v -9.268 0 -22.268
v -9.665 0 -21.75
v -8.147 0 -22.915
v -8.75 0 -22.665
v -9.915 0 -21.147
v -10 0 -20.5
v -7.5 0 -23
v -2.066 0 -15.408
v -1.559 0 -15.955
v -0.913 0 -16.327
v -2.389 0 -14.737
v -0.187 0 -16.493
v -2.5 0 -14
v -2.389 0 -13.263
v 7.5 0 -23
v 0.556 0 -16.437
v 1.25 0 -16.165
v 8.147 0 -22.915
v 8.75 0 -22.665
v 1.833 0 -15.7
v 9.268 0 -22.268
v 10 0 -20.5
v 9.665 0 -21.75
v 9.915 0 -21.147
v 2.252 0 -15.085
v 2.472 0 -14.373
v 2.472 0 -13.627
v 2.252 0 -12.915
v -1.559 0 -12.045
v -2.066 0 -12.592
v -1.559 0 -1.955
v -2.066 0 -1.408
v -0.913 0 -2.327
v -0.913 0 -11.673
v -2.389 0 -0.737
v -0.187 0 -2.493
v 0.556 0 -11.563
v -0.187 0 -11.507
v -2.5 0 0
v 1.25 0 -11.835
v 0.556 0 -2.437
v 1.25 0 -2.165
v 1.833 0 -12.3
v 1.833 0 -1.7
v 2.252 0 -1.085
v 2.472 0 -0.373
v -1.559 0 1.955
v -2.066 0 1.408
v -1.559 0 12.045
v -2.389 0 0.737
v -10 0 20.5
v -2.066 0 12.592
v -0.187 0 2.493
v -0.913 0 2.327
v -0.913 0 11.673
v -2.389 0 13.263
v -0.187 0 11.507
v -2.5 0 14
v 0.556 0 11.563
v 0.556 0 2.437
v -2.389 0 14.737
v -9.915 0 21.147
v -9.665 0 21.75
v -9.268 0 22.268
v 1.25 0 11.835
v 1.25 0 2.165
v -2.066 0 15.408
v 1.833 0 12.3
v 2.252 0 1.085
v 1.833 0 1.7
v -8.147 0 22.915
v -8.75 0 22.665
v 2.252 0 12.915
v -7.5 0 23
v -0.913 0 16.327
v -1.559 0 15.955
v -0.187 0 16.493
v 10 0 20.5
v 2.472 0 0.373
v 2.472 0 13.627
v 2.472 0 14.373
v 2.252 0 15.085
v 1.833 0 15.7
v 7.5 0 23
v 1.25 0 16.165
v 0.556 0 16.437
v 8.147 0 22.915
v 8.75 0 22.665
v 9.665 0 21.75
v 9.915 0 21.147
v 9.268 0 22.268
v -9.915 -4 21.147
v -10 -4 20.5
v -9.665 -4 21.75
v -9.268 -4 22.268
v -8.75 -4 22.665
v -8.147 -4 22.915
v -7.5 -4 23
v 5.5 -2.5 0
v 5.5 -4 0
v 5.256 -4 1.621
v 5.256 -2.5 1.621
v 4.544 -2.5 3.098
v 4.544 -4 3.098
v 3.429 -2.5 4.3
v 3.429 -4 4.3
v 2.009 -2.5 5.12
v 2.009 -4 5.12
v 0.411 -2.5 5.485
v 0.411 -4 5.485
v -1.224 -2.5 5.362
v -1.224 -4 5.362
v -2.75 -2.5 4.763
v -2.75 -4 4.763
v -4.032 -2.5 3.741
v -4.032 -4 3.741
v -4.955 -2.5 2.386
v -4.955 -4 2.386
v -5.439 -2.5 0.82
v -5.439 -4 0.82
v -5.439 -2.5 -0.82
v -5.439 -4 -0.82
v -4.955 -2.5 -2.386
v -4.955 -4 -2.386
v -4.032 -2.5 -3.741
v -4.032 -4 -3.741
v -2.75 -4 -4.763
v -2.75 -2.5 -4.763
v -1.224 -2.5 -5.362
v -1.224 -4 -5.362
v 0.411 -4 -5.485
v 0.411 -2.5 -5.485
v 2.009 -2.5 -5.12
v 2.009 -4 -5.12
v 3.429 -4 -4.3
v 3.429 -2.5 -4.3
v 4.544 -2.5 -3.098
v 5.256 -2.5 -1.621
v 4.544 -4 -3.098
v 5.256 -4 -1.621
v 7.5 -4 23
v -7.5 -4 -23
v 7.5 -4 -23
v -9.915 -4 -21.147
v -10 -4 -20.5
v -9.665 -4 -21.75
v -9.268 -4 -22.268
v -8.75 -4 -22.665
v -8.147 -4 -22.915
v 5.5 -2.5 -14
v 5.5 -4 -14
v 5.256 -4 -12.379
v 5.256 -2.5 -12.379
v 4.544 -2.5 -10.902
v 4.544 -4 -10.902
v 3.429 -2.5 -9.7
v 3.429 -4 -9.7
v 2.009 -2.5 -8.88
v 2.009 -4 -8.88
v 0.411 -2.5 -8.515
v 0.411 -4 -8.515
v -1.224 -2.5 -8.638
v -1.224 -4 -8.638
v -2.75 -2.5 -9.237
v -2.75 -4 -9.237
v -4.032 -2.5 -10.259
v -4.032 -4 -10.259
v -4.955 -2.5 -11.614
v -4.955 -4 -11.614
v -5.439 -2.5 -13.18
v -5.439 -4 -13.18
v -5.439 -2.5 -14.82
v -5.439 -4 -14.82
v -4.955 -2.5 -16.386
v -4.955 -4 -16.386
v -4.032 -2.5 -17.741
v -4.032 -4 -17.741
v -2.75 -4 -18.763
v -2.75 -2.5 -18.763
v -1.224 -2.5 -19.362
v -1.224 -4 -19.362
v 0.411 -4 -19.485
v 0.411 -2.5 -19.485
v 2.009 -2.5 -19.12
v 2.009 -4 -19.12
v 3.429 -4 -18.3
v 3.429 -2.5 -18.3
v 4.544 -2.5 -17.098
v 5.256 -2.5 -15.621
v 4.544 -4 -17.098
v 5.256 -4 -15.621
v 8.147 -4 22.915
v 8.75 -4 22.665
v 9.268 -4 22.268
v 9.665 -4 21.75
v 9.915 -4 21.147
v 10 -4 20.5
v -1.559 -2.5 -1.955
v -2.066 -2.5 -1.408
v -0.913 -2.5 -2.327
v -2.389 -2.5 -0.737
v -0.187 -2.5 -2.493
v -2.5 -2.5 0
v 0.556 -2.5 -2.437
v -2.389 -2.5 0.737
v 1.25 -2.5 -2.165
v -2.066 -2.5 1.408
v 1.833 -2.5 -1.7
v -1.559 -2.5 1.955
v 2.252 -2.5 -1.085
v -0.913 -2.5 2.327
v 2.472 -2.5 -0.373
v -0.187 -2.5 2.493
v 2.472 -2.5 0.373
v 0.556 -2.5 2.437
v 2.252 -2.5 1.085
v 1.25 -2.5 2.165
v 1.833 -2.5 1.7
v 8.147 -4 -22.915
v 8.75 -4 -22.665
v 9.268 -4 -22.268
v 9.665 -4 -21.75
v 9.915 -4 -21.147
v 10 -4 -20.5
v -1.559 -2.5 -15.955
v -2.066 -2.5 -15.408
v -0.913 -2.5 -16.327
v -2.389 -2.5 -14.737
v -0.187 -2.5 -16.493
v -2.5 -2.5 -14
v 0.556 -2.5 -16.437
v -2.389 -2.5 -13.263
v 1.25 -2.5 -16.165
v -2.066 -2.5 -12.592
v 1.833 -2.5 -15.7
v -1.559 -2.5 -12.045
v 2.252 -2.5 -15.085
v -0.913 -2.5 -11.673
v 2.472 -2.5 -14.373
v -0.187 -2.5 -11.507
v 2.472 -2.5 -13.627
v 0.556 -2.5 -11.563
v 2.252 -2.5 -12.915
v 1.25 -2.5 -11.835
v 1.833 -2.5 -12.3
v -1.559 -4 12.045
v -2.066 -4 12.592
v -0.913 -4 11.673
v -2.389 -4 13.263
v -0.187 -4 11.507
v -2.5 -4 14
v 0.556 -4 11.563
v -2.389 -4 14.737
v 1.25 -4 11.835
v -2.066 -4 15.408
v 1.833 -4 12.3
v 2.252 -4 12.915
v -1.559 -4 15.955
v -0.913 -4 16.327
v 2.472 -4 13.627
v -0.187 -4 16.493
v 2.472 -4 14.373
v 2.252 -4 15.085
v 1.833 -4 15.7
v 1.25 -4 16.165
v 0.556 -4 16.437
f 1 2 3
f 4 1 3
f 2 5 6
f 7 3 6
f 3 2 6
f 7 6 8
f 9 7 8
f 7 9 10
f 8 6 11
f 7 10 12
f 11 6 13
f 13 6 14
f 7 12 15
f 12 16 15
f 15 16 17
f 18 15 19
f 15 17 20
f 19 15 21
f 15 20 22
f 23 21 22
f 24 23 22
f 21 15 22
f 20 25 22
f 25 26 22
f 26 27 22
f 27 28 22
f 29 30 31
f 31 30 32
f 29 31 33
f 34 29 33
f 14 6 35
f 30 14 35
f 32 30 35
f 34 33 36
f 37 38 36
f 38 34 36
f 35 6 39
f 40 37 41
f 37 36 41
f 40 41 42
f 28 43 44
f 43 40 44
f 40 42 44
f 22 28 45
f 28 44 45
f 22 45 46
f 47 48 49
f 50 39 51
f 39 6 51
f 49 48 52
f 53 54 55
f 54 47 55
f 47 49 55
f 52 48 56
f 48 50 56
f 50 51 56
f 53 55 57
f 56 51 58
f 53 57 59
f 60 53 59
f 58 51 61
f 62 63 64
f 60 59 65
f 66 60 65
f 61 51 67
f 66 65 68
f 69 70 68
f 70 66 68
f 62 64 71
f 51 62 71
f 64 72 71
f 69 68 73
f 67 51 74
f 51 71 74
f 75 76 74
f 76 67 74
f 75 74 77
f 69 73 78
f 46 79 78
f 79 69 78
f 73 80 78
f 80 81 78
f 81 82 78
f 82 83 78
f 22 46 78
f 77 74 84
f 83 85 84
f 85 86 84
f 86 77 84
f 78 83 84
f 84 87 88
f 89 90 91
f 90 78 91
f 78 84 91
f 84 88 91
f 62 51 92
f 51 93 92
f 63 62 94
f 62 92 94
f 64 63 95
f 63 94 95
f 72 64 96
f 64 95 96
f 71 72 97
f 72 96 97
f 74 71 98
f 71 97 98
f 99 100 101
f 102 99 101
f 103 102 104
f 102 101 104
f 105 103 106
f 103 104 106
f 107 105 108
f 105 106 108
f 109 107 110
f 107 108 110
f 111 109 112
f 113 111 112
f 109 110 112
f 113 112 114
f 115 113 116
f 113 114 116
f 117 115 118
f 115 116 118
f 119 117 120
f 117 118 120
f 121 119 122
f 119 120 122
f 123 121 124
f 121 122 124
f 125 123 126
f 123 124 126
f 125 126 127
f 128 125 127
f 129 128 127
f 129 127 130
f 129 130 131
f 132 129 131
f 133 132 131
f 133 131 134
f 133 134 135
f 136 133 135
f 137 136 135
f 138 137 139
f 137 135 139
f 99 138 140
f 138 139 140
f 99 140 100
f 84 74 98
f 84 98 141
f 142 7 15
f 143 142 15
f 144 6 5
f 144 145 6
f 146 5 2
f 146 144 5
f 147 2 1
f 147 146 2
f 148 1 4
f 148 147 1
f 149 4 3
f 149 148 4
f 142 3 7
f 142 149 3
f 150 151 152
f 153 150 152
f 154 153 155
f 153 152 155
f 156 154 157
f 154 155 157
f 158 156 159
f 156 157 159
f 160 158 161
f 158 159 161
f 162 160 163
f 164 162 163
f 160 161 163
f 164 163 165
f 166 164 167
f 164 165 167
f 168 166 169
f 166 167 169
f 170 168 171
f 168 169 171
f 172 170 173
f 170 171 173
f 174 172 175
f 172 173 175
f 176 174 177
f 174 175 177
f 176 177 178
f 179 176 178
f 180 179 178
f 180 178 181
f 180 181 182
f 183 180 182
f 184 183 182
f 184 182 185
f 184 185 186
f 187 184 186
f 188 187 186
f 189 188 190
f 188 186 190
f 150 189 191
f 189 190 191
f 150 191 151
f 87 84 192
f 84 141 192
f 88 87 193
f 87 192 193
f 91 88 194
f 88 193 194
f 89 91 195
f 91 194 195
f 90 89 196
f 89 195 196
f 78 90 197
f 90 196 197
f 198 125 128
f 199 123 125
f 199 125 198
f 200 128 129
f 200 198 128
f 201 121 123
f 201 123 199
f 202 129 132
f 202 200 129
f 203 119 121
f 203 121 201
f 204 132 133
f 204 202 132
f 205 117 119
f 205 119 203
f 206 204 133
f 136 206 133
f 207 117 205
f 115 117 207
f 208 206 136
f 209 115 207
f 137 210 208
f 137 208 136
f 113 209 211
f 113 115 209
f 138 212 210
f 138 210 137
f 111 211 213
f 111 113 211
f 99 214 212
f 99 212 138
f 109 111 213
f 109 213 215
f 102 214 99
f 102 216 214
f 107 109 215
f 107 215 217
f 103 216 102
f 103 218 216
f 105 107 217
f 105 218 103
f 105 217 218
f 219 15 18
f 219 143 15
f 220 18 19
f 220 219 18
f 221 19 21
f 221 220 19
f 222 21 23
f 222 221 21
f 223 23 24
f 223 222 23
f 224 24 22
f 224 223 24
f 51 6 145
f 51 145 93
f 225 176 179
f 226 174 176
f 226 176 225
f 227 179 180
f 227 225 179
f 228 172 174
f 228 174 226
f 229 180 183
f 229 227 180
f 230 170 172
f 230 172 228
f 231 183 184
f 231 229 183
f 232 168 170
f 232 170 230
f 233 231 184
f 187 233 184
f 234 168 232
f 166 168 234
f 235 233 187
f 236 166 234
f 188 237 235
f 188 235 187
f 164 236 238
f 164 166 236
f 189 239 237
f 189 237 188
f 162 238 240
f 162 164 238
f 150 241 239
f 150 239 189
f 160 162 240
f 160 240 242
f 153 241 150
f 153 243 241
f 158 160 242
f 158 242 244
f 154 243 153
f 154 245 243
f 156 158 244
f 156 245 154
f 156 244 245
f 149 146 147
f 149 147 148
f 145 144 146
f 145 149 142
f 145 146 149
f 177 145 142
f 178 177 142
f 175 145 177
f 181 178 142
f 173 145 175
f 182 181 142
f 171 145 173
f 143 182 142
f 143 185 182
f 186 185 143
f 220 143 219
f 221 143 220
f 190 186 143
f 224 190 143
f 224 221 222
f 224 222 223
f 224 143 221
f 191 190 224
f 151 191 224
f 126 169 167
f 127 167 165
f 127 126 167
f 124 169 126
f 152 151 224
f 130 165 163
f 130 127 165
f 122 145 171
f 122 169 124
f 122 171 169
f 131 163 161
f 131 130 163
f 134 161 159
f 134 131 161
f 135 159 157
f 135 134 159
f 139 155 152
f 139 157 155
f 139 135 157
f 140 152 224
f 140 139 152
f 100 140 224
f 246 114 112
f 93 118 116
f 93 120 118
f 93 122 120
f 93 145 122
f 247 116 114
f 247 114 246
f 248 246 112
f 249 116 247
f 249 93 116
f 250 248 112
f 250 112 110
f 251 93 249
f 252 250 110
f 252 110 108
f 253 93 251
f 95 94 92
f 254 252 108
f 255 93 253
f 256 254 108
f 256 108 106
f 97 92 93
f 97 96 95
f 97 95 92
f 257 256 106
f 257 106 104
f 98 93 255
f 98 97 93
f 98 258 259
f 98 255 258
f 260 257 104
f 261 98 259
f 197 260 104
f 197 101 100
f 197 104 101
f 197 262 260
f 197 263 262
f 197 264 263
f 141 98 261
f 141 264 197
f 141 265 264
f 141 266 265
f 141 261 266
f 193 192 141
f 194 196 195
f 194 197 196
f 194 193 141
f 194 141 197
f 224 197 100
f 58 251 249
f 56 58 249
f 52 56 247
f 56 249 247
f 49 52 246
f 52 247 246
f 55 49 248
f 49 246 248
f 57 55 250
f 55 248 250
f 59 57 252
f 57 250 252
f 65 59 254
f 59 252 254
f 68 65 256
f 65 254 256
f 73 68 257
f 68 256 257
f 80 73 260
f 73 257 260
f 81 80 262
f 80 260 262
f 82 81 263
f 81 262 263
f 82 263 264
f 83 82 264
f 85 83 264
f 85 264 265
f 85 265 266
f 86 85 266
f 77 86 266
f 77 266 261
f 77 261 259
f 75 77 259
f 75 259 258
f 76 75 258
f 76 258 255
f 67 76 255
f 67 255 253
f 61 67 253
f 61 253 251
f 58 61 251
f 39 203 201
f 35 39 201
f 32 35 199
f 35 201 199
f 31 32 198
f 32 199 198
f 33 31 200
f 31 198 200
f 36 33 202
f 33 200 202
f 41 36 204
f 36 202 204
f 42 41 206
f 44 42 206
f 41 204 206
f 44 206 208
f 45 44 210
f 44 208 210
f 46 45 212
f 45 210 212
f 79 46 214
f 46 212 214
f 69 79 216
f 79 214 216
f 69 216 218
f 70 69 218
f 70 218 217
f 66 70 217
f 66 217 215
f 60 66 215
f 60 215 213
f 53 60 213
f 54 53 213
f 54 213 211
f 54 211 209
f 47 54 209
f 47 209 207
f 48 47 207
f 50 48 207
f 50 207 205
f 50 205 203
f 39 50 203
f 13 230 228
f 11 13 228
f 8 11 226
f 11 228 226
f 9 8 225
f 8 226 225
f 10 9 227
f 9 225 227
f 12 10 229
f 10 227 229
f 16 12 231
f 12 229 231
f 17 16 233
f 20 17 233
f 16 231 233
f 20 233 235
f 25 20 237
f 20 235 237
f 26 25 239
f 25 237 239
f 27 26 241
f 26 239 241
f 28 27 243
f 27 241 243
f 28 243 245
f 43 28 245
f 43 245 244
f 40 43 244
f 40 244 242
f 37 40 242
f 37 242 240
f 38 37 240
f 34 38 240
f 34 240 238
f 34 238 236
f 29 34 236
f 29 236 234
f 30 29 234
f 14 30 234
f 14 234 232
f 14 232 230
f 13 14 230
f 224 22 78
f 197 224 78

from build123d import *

# Parameters (mm, degrees)
F0_W     = 20
F0_H     = 46
F1_DEPTH = 4
F2_D     = 5
F3_R     = 5.5
F4_DEPTH = 1.5
F5_R     = 2.5


with BuildPart() as f1:
    # F0 (on Front) → F1 (new body)
    with BuildSketch(Plane.XZ):
        Rectangle(F0_W, F0_H)
    extrude(amount=F1_DEPTH)

    # F2 (through all)
    with Locations(Plane(origin=(0, 0, 0), x_dir=(1, 0, 0), z_dir=(0, 1, 0))):
        with Locations((0, 14), (0, 0), (0, -14)):
            Hole(F2_D / 2)

    # F3 (on face) → F4 (cut)
    with BuildSketch(Plane.XZ.offset(4)):
        Circle(F3_R)
        with Locations((0, -14)):
            Circle(F3_R)
    extrude(amount=-F4_DEPTH, mode=Mode.SUBTRACT)

    # F5
    f5_edges = [f1.edges().sort_by_distance(p)[0] for p in [
        (10, -2, 23),
        (-10, -2, 23),
        (10, -2, -23),
        (-10, -2, -23),
    ]]
    fillet(f5_edges, radius=F5_R)


solid = f1.part
